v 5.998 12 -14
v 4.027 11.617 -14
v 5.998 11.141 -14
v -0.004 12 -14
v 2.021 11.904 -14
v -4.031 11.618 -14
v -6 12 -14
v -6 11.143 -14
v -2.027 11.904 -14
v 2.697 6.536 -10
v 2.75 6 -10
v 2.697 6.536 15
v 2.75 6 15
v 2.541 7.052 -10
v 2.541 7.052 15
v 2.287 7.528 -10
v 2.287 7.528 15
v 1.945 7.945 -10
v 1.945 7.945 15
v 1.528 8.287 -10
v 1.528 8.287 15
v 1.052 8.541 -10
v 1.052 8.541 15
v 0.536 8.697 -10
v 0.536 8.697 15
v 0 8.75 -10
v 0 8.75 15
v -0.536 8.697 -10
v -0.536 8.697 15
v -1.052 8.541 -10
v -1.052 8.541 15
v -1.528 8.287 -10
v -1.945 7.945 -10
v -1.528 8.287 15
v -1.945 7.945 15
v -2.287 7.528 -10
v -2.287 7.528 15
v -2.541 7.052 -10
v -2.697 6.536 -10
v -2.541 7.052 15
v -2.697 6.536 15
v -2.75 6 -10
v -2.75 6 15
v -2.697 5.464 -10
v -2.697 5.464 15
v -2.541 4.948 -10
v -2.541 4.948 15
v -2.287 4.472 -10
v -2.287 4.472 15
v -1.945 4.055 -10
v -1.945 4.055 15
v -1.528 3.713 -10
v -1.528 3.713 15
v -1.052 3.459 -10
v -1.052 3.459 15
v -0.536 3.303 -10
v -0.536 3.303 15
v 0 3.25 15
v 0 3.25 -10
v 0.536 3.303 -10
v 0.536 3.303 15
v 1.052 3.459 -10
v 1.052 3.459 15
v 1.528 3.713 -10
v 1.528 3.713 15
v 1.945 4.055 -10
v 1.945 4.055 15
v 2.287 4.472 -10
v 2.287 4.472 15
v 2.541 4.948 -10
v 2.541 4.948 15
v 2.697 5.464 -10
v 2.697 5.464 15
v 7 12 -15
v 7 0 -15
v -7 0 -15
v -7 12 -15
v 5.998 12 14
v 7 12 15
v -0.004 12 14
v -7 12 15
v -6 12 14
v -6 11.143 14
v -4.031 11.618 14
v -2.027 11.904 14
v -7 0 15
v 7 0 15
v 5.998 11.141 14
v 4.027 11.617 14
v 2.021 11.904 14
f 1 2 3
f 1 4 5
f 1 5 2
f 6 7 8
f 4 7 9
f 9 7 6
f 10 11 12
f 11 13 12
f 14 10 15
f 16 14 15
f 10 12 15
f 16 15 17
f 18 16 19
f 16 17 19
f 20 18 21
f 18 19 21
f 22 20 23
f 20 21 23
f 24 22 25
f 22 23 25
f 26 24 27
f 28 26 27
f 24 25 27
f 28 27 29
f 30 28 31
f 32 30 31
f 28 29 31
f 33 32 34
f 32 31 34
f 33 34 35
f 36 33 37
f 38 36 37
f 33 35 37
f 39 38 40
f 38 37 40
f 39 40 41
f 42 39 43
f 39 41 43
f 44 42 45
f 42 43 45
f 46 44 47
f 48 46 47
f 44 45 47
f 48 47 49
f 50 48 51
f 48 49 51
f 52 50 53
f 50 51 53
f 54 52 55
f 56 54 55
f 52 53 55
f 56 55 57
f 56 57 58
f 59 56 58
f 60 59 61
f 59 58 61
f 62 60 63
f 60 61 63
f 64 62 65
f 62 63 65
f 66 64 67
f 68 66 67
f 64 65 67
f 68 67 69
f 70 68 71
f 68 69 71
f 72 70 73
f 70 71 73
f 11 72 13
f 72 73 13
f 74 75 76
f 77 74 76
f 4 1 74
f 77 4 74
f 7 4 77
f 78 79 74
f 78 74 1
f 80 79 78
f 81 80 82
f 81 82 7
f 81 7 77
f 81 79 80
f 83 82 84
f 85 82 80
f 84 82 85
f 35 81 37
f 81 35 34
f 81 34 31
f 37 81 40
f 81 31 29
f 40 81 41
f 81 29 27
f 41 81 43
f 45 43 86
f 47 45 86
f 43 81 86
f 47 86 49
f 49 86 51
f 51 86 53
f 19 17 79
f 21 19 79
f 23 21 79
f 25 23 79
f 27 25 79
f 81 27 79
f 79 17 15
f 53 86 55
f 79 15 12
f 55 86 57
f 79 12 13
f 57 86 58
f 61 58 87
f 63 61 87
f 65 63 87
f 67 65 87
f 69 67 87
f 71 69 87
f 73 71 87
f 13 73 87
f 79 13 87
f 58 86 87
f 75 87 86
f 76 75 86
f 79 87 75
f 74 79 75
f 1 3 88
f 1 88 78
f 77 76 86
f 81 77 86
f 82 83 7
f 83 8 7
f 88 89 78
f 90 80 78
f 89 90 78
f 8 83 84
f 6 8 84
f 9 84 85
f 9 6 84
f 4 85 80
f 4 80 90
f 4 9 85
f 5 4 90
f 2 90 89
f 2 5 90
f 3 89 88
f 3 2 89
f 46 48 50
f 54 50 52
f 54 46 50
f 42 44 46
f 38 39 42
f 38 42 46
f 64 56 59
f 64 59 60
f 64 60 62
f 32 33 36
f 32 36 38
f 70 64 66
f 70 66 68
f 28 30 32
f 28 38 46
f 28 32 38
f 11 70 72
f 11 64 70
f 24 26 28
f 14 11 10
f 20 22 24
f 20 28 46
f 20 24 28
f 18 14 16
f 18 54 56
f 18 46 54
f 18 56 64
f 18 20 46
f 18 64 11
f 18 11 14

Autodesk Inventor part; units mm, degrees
ref_plane "YZ Plane" through (0, 0, 0) normal (1, 0, 0) x (0, 1, 0)
ref_plane "XZ Plane" through (0, 0, 0) normal (0, 1, 0) x (-1, 0, 0)
ref_plane "XY Plane" through (0, 0, 0) normal (0, 0, 1) x (1, 0, 0)
sketch "Sketch1" plane through (0, 0, 0) normal (0, 1, 0) x (-1, 0, 0)
  line L0 (-7, 15) -> (-7, -15)
  line L1 (-7, -15) -> (7, -15)
  line L2 (7, -15) -> (7, 15)
  line L3 (7, 15) -> (-7, 15)
  line L4 (-7, 15) -> (7, -15) construction
  line L5 (-7, -15) -> (7, 15) construction
  point P0 (0, 0)
  dimension "d0" = 30
  dimension "d1" = 14
extrude "Extrusion1" add sketch "Sketch1" along normal blind 12
sketch "Sketch2" plane through (-7, 0, 15) normal (0, 0, 1) x (1, 0, 0)
  circle A0 centre (7, 6) radius 2.75
  point P0 (7, 0)
  dimension "d4" = 5.5
extrude "Extrusion2" cut sketch "Sketch2" against normal blind 25
sketch "Sketch3" plane through (0, 12, 0) normal (0, 1, 0) x (1, 0, 0)
  line L0 (7, -15) -> (7, 15) projected
  line L1 (7, 15) -> (-7, 15) projected
  line L2 (-7, 15) -> (-7, -15) projected
  line L3 (-7, -15) -> (7, -15) projected
  line L4 (-6, -14) -> (-6, 14)
  line L5 (-6, 14) -> (6, 14)
  line L6 (6, 14) -> (6, -14)
  line L7 (6, -14) -> (-6, -14)
  point P0 (0, 0)
  dimension "d7" = 1
sketch "Sketch4" plane through (0, 0, 0) normal (0, 0, 1) x (1, 0, 0)
  line L0 (7, 12) -> (-7, 12) projected
  line L1 (-7, 12) -> (7, 0)
  line L2 (7, 0) -> (7, 12) projected
  line L3 (7, 0) -> (7, 12)
  line L4 (7, 12) -> (-7, 0)
  line L5 (-7, 0) -> (-6, 0)
  line L6 (7, 0) -> (-7, 0) projected
  line L7 (-6, 0) -> (-6, 12)
  arc A0 (5.9979, 11.1411) -> (-6, 11.1429) centre (-0.0041, -9.3998) ccw
  line L8 (5.9979, 11.1411) -> (5.9979, 12)
  point P0 (0, 0)
  dimension "d8" = 1
extrude "Extrusion3" cut sketch "Sketch4" along normal mid plane 28 contours L8 A0 L0 | A0 L7 L0
properties part number "Solonoid Outside"
